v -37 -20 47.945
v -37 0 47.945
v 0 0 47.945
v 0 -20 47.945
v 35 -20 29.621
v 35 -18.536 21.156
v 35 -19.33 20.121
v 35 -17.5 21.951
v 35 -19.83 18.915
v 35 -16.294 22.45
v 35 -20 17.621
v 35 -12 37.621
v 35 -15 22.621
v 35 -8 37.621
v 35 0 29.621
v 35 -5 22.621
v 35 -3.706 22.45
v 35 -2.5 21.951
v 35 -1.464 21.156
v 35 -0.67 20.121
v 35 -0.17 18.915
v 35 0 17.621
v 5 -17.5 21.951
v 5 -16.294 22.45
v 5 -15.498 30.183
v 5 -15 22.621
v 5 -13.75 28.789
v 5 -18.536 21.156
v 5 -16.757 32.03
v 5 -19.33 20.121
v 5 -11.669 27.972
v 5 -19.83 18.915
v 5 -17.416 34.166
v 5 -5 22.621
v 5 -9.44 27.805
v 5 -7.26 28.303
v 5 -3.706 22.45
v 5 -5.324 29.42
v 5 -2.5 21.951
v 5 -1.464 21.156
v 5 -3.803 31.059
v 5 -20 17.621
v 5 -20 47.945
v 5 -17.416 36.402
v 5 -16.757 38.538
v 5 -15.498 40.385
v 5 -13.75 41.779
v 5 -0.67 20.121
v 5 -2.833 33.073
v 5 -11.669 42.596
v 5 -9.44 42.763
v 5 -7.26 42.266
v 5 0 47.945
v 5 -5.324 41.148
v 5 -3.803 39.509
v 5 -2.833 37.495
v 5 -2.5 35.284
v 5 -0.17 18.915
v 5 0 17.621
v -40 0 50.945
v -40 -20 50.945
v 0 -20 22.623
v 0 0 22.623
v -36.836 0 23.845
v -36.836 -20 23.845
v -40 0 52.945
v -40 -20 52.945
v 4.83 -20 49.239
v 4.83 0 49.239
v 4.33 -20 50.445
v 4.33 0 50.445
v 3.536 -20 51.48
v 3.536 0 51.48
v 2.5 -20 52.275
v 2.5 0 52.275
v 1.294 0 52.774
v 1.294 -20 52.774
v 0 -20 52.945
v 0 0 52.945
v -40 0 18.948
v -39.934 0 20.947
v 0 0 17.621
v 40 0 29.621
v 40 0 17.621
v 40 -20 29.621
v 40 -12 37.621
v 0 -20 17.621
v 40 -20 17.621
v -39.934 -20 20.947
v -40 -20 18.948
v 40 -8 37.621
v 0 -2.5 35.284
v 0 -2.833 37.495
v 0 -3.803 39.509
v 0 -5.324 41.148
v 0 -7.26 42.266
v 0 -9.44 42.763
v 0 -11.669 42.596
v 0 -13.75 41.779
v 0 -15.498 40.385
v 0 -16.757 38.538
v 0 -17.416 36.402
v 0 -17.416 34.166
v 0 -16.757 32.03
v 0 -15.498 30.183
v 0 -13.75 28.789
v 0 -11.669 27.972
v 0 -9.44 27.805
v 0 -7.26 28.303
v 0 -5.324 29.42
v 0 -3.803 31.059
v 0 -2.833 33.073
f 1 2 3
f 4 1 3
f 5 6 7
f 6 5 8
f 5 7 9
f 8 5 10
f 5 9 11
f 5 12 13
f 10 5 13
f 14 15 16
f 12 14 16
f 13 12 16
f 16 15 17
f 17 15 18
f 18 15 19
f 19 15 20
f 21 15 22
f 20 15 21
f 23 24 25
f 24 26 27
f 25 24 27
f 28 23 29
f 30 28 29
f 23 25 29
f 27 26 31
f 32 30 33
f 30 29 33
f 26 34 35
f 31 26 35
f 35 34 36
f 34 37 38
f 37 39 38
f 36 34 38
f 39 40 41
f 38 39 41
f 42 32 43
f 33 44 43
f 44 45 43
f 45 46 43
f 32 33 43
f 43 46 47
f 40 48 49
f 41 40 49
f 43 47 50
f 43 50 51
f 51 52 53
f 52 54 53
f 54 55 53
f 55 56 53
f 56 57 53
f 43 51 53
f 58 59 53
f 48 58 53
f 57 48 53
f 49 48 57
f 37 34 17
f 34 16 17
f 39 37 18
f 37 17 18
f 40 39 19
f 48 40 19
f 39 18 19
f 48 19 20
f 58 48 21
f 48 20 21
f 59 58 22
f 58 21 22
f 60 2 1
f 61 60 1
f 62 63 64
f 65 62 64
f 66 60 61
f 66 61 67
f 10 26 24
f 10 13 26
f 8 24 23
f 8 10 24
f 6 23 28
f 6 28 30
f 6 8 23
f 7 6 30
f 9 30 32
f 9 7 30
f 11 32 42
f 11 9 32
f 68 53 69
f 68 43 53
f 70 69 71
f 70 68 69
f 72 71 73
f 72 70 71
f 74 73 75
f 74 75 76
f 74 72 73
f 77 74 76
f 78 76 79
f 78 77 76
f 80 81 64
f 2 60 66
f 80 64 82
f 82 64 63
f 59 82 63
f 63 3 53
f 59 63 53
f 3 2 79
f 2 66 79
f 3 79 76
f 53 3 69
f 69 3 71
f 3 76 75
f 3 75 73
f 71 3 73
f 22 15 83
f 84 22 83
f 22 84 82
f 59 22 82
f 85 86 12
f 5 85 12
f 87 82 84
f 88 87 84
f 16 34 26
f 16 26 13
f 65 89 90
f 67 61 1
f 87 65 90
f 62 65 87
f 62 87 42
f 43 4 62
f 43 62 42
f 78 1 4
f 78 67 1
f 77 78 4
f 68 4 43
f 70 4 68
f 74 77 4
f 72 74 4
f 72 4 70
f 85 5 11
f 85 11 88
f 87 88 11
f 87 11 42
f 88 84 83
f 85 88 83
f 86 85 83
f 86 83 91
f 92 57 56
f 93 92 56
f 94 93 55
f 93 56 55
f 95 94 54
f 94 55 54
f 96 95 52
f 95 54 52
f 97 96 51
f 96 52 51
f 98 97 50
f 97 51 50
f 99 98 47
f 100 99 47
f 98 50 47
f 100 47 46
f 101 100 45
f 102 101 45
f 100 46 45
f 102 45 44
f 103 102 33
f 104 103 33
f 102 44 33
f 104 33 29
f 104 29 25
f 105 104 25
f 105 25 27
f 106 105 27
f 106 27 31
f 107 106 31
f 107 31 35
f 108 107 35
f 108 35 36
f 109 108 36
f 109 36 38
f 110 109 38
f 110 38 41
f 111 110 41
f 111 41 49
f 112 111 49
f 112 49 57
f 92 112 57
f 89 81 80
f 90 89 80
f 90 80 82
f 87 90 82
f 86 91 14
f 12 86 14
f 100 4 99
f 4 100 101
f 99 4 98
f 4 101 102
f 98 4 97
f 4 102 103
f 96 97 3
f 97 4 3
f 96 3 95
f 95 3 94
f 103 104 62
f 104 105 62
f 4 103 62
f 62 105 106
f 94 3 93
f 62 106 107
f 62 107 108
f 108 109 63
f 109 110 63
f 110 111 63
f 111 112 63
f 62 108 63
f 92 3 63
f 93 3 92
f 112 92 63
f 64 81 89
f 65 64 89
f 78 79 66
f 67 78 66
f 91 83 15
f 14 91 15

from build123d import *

# Parameters (mm, degrees)
F0_W           = 40
F0_H           = 5
F0_W_2         = 30
F1_DEPTH       = 20
F2_R           = 4.99999
F3_SIZE        = 3
F5_D           = 15
F5_DEPTH       = 20
F5_CBORE_D     = 15
F5_CBORE_DEPTH = 5
F5_TIP         = 4.5064546427
F6_SIZE        = 8


# Not quite as in the source:
# - a fillet or chamfer is up to 0.001 mm smaller than in the source, because OpenCascade refuses the exact size


with BuildPart() as f1:
    # F0 (on Front) → F1 (new body)
    with BuildSketch(Plane.XZ):
        with Locations((-20, 50.4448633795)):
            Rectangle(F0_W, F0_H)
        Polygon((5, 52.9448633795), (0, 52.9448633795), (0, 47.9448633795), (0, 22.6232533795), (0, 17.6205022253), (5, 17.6205022253), (5, 22.6205022253), align=None)
        Polygon((0, 17.6205022253), (0, 22.6232533795), (-39.8342023775, 23.9448633795), (-40, 18.9476130207), align=None)
        with Locations((20, 20.1205022253)):
            Rectangle(F0_W_2, F0_H)
        Polygon((35, 37.6205022253), (35, 22.6205022253), (35, 17.6205022253), (40, 17.6205022253), (40, 37.6205022253), align=None)
    extrude(amount=F1_DEPTH)

    # F2 (radius 5 in the source; OpenCascade refuses exactly that, so slightly less here)
    f2_edges = [f1.edges().sort_by_distance(p)[0] for p in [
        (20, -20, 22.620502),
        (20, 0, 22.620502),
        (5, -10, 52.944863),
    ]]
    fillet(f2_edges, radius=F2_R)

    # F3
    f3_edges = [f1.edges().sort_by_distance(p)[0] for p in [
        (-40, -10, 47.944863),
        (-39.834202, -10, 23.944863),
    ]]
    chamfer(f3_edges, length=F3_SIZE)

    # F5
    with Locations(Plane(origin=(0, 0, 0), x_dir=(0, -1, 0), z_dir=(-1, 0, 0))):
        with Locations((10, 35.2840583795)):
            CounterBoreHole(F5_D / 2, F5_CBORE_D / 2, F5_CBORE_DEPTH, depth=F5_DEPTH)
            with Locations((0, 0, -(F5_DEPTH + F5_TIP / 2))):  # 118° drill point
                Cone(0, F5_D / 2, F5_TIP, mode=Mode.SUBTRACT)

    # F6
    f6_edges = [f1.edges().sort_by_distance(p)[0] for p in [
        (37.5, 0, 37.620502),
        (37.5, -20, 37.620502),
    ]]
    chamfer(f6_edges, length=F6_SIZE)


solid = f1.part
